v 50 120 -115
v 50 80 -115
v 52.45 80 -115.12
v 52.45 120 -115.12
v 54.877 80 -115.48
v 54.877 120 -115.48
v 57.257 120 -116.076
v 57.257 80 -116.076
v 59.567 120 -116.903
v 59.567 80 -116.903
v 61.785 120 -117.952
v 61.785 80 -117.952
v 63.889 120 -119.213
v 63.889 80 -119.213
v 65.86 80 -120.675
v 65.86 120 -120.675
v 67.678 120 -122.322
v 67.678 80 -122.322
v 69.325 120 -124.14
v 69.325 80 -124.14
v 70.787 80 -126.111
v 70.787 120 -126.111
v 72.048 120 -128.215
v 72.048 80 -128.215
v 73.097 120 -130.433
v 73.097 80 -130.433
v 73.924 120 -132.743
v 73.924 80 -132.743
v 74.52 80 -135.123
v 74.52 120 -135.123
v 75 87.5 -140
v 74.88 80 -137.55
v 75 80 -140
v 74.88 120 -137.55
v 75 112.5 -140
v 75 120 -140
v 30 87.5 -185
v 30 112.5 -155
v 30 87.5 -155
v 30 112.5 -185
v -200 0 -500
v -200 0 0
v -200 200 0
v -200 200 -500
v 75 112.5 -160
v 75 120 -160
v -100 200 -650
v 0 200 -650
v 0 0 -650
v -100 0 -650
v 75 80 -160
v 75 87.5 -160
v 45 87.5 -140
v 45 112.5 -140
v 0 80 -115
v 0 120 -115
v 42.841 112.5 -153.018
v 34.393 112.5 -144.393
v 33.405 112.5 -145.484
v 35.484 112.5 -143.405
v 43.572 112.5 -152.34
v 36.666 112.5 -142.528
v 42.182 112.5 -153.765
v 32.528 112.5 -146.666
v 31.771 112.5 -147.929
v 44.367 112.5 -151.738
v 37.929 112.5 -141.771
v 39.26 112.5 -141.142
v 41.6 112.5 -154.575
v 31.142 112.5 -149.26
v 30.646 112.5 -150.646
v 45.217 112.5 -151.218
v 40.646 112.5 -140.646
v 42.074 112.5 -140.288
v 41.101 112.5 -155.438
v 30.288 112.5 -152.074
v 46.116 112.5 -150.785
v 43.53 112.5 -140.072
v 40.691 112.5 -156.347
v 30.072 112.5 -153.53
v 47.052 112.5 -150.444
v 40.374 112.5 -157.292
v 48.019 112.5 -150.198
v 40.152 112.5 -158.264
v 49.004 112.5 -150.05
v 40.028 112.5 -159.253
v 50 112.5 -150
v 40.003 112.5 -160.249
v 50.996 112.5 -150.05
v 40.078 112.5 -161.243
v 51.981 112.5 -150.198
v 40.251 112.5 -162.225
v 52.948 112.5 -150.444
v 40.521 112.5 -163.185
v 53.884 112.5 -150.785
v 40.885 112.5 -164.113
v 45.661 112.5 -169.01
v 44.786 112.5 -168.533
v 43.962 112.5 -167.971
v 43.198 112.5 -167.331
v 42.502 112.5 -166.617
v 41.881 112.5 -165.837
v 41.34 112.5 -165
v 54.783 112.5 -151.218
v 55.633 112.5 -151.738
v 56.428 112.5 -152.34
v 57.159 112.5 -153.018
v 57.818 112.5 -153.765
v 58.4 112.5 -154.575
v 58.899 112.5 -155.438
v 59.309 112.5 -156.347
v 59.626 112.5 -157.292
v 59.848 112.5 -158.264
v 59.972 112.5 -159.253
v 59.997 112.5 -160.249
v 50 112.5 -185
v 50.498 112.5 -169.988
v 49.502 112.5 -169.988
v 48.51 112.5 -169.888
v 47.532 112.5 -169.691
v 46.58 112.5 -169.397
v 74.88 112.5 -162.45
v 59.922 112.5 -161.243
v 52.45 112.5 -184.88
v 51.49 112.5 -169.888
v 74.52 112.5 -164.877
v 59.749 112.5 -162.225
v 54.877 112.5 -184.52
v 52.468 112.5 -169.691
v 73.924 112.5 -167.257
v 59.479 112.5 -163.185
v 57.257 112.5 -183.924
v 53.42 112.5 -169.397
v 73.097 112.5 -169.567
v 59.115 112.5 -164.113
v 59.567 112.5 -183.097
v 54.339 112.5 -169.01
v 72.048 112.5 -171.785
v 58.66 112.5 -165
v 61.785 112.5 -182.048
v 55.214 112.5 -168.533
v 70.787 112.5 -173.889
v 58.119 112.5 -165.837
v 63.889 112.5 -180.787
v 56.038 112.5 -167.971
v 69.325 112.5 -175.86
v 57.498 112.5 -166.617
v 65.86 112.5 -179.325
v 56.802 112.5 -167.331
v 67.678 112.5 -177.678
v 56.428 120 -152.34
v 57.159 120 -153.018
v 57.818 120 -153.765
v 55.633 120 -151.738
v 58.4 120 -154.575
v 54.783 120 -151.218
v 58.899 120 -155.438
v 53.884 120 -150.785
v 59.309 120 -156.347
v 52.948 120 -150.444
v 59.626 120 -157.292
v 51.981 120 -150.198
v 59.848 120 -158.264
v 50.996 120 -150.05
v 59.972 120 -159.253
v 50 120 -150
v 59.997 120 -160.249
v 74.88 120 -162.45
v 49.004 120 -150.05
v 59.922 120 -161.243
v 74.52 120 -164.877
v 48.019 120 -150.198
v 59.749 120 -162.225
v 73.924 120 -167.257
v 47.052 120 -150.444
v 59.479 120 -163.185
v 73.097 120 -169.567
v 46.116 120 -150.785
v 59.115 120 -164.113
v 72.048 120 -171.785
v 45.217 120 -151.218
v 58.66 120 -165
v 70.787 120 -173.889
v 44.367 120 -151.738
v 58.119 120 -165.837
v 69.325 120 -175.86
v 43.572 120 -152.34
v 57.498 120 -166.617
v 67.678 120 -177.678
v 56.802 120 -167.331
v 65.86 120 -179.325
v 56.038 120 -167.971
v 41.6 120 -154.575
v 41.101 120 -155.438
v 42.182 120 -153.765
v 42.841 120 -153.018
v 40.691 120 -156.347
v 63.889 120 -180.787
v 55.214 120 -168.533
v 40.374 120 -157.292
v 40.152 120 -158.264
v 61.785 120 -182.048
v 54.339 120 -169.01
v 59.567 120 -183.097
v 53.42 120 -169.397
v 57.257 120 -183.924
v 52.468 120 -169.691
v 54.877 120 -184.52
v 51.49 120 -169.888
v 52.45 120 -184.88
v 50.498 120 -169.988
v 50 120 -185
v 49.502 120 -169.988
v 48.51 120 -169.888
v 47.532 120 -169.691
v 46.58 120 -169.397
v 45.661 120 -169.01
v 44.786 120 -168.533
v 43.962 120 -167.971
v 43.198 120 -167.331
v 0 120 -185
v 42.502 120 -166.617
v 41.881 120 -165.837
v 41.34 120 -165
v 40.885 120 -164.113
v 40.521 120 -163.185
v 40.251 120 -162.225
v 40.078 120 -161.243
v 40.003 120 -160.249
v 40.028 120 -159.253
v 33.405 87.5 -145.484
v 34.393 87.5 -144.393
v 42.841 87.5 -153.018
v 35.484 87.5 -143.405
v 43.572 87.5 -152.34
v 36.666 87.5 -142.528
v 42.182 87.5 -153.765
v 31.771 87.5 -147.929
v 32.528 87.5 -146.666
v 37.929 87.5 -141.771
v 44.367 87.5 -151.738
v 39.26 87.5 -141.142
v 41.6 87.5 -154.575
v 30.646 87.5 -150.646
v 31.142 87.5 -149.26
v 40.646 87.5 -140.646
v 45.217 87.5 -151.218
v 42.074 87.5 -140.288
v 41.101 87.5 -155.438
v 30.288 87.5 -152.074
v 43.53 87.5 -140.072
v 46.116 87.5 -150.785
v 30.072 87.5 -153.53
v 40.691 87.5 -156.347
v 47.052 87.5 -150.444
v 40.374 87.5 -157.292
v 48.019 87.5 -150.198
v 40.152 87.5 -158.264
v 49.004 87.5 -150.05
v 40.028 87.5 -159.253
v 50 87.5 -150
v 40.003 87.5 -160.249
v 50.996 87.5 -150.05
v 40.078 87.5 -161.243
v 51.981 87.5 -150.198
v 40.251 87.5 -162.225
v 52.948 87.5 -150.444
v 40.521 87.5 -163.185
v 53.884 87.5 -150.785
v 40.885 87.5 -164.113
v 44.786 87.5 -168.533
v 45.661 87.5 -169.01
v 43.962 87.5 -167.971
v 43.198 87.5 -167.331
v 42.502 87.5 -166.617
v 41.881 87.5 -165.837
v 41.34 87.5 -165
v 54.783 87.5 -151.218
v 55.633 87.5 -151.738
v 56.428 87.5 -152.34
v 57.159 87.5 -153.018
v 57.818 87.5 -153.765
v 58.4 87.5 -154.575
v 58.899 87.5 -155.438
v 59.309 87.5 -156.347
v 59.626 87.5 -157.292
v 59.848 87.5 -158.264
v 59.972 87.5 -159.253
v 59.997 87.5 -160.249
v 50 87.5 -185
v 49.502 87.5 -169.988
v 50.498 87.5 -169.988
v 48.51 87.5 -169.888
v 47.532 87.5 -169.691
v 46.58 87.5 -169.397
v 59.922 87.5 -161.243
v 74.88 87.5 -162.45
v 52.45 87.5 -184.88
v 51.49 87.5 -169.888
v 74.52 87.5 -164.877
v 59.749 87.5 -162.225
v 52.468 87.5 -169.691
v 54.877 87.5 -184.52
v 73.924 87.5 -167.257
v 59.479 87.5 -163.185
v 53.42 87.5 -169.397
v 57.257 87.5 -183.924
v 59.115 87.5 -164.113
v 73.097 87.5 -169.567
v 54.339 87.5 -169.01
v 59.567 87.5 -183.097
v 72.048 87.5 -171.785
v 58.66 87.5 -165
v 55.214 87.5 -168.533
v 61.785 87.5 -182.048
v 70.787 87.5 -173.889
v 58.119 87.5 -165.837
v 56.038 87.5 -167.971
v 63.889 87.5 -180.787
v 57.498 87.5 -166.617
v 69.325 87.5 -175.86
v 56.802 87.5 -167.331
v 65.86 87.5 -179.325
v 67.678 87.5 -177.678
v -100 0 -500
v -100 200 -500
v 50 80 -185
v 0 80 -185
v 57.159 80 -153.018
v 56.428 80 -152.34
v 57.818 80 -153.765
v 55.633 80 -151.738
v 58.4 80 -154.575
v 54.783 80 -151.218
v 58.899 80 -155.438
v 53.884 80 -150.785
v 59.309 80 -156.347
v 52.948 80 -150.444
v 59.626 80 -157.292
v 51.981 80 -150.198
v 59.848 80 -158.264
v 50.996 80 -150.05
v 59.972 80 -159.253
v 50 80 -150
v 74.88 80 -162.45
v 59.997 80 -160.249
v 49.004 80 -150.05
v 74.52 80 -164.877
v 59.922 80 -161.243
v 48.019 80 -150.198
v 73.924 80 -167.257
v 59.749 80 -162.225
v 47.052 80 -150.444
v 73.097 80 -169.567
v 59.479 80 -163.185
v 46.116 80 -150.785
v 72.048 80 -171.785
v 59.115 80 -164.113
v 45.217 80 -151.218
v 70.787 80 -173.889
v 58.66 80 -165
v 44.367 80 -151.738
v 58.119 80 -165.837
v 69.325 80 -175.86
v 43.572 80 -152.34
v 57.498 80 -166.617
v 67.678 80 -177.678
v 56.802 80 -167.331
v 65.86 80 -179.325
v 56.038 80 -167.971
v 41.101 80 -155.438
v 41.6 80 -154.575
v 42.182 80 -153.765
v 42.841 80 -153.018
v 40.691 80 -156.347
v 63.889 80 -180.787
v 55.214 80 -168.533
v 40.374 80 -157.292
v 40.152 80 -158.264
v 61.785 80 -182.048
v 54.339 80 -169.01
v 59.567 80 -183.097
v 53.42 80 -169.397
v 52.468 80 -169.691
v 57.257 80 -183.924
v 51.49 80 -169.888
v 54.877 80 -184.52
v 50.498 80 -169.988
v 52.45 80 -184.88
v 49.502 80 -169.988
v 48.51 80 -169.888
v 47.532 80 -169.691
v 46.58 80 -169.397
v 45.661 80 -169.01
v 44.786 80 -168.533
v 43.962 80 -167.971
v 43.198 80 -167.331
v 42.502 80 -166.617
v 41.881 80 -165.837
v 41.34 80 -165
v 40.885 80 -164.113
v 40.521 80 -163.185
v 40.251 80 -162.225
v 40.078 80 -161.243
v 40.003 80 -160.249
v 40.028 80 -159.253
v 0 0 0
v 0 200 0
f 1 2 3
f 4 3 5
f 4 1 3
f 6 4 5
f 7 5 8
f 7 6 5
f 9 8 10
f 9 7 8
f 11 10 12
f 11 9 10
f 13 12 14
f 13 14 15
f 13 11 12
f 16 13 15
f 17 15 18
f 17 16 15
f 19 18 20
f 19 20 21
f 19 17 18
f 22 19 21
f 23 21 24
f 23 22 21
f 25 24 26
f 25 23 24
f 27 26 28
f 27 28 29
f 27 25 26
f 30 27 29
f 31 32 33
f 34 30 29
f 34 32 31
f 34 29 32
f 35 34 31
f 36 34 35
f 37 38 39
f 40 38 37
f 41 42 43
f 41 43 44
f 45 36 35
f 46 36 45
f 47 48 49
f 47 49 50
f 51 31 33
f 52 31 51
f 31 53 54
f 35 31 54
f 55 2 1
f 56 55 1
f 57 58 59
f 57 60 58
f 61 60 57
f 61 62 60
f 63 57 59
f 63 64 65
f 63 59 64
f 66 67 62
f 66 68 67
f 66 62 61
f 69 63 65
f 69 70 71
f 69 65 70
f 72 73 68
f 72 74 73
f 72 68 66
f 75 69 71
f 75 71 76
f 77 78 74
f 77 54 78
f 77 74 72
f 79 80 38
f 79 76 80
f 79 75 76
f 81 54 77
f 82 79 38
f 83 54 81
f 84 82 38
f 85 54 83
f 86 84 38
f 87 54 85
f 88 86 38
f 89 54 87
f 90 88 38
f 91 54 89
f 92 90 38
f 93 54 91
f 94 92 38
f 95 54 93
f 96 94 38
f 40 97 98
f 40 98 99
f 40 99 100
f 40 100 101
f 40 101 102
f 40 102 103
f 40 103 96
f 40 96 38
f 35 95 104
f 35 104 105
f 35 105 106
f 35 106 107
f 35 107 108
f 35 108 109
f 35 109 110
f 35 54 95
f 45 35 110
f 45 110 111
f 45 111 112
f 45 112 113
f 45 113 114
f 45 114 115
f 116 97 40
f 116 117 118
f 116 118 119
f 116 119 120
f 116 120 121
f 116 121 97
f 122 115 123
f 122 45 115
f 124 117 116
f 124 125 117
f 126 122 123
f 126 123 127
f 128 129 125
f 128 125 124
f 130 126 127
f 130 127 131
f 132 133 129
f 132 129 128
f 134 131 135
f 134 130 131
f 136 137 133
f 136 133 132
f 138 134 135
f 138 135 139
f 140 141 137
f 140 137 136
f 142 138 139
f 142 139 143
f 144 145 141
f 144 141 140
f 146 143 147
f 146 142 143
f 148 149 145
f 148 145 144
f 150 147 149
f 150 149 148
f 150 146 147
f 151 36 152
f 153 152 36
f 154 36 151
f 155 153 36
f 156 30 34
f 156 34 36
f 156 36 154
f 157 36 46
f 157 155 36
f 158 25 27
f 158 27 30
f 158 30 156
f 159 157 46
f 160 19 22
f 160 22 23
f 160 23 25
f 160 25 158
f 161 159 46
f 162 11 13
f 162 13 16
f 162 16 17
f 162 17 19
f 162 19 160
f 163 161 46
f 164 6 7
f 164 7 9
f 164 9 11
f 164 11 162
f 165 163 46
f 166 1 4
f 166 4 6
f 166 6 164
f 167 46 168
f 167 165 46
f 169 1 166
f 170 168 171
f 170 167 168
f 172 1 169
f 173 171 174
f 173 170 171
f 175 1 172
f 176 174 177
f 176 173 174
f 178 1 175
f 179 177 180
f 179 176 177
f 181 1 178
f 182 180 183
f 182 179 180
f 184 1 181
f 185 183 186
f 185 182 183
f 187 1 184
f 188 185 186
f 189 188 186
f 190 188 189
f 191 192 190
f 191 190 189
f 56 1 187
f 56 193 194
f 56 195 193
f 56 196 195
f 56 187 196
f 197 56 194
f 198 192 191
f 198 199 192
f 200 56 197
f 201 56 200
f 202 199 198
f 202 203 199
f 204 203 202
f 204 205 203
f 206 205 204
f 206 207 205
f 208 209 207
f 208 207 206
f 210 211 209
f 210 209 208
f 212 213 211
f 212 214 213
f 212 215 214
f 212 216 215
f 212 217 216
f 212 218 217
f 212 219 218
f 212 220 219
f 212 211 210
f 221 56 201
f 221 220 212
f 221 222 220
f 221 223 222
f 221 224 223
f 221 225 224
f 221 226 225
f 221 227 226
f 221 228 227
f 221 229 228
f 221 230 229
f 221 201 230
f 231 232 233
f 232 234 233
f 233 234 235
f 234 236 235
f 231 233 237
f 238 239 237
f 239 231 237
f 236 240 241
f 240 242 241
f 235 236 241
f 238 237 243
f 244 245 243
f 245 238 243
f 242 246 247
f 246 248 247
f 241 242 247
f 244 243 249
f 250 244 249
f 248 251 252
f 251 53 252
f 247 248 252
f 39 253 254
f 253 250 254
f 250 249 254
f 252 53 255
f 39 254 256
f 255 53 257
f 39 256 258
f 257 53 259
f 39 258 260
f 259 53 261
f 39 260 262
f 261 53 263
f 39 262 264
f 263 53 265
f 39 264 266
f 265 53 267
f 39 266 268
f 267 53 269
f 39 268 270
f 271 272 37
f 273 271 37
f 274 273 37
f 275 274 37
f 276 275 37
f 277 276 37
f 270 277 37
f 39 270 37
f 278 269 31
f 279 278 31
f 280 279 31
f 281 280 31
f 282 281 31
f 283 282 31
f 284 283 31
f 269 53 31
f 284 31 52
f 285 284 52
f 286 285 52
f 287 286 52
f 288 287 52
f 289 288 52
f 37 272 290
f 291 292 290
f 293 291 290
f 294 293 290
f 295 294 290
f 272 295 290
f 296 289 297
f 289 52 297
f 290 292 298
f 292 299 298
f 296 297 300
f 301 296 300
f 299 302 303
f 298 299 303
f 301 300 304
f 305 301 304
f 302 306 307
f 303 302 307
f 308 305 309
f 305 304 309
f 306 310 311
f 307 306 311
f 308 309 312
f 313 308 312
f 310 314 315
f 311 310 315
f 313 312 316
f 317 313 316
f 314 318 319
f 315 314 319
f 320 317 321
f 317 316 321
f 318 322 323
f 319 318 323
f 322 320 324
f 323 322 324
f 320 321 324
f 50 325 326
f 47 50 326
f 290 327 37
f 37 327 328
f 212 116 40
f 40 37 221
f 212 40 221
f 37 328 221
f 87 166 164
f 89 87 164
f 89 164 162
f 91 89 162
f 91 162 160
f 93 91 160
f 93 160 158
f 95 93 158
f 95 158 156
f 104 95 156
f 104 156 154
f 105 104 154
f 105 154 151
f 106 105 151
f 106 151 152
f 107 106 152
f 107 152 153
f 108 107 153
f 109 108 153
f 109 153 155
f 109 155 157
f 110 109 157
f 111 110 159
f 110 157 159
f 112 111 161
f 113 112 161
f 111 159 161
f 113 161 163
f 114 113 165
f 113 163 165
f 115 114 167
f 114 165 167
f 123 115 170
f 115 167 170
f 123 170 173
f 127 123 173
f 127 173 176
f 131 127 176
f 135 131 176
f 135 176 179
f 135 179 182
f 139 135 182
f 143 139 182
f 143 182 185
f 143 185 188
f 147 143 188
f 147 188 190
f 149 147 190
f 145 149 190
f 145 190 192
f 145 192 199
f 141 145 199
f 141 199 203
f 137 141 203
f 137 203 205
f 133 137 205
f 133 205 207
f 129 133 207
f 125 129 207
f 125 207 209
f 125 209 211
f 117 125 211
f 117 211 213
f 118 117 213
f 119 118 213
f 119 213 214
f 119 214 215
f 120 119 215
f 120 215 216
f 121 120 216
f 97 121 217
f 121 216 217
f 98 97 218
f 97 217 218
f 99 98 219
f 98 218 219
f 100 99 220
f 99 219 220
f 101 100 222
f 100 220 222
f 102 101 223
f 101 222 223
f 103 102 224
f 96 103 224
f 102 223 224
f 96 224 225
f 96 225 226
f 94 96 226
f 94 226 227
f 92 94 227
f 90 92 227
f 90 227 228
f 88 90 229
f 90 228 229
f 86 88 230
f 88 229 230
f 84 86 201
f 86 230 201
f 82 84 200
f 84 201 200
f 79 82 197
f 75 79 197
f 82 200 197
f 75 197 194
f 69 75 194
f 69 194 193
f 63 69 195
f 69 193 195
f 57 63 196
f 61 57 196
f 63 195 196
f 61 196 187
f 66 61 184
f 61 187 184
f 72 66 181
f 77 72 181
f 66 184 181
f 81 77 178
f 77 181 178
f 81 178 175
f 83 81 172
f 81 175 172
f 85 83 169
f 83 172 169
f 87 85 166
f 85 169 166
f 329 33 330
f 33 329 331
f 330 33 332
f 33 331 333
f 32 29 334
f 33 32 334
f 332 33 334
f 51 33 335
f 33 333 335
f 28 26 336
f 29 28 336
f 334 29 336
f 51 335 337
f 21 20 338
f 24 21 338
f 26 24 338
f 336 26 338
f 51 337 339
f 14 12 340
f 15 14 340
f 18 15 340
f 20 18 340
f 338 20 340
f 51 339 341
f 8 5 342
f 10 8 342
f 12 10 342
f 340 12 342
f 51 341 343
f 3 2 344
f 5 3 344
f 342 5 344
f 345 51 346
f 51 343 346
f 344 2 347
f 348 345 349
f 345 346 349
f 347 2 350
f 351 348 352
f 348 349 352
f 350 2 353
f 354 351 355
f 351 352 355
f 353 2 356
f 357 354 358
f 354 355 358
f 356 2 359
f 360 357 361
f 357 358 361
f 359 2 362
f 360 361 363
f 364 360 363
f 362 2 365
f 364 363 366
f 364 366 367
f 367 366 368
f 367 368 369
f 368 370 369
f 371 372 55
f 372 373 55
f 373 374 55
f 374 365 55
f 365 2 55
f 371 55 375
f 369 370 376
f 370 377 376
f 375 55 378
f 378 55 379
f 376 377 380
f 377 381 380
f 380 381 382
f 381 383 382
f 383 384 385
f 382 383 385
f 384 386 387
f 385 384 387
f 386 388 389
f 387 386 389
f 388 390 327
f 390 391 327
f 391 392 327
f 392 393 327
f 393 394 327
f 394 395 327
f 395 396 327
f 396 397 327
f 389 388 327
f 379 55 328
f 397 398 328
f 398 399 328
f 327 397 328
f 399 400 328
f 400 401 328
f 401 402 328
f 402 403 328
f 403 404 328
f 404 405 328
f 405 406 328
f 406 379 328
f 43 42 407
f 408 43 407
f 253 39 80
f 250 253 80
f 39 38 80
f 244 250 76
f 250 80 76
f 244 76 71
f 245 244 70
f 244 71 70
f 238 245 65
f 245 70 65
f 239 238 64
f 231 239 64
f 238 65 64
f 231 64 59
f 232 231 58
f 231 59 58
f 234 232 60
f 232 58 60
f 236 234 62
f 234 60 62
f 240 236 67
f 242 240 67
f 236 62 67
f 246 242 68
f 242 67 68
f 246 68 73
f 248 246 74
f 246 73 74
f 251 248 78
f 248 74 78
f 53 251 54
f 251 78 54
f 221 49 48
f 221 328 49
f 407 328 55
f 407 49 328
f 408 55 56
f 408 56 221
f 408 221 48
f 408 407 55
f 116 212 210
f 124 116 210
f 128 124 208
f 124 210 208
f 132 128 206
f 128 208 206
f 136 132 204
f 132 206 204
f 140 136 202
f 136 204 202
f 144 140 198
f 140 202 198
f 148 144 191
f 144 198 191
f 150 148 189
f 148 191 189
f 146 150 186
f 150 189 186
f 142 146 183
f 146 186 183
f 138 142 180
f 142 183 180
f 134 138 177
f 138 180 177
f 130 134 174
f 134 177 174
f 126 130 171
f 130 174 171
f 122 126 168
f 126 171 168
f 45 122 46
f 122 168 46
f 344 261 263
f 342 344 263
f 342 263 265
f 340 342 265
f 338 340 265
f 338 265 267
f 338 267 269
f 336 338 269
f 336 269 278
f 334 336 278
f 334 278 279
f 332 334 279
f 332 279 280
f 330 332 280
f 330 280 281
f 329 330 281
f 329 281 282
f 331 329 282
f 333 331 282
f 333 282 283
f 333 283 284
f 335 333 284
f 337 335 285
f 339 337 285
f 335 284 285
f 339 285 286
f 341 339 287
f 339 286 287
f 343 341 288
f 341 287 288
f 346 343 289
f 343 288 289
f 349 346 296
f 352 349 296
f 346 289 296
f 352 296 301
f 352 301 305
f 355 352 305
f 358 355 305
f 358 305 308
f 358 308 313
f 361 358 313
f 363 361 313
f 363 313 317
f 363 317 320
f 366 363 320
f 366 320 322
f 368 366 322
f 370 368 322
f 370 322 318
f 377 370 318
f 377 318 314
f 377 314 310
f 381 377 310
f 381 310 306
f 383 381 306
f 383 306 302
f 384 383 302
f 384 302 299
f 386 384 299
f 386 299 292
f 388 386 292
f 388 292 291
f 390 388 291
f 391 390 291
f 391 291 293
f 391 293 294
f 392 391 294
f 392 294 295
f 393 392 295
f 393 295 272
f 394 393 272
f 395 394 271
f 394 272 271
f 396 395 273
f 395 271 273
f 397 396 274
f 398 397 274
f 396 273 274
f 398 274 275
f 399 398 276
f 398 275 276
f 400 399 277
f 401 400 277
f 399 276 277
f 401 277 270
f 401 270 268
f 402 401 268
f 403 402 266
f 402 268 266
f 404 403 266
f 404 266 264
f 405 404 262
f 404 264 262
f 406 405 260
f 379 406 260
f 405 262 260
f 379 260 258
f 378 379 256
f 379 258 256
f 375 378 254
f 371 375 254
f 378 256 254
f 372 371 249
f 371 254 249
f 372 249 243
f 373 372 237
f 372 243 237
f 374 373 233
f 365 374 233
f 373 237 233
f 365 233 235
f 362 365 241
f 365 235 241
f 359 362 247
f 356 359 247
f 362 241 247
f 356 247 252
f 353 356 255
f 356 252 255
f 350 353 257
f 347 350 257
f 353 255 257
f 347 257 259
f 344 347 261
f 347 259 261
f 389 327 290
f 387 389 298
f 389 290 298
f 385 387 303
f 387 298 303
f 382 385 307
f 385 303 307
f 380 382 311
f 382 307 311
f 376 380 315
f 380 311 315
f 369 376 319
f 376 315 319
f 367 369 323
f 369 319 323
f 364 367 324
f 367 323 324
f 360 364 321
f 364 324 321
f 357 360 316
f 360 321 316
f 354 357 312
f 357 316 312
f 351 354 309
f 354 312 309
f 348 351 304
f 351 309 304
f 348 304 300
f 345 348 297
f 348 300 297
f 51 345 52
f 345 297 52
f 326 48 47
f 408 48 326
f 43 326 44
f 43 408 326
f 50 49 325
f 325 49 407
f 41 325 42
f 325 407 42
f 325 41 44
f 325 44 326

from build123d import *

# Parameters (mm, degrees)
SKETCH1_W           = 200
SKETCH1_H           = 500
BOSS_EXTRUDE1_DEPTH = 200
SKETCH2_W           = 70
SKETCH2_H           = 40
BOSS_EXTRUDE2_DEPTH = 75
FILLET1_R           = 25
SKETCH3_R           = 10
CUT_EXTRUDE1_DEPTH  = 75
SKETCH4_W           = 100
SKETCH4_H           = 200
BOSS_EXTRUDE3_DEPTH = 150
SKETCH6_W           = 45
SKETCH6_H           = 25
CUT_EXTRUDE2_DEPTH  = 45
FILLET2_R           = 15


with BuildPart() as part:
    # Sketch1 → Boss-Extrude1 (new body)
    with BuildSketch(Plane(origin=(0, 0, 0), x_dir=(1, 0, 0), z_dir=(0, 1, 0))):
        with Locations((-100, 250)):
            Rectangle(SKETCH1_W, SKETCH1_H)
    extrude(amount=BOSS_EXTRUDE1_DEPTH)

    # Sketch2 → Boss-Extrude2 (add)
    with BuildSketch(Plane(origin=(0, 0, 0), x_dir=(0, 0, -1), z_dir=(1, 0, 0))):
        with Locations((150, 100)):
            Rectangle(SKETCH2_W, SKETCH2_H)
    extrude(amount=BOSS_EXTRUDE2_DEPTH)

    # Fillet1
    fillet1_edges = [part.edges().sort_by_distance(p)[0] for p in [
        (75, 100, -185),
        (75, 100, -115),
    ]]
    fillet(fillet1_edges, radius=FILLET1_R)

    # Sketch3 → Cut-Extrude1 (cut)
    with BuildSketch(Plane(origin=(0, 120, 0), x_dir=(1, 0, 0), z_dir=(0, 1, 0))):
        with Locations(Location((50, 160, 0), (0, 0, 270))):
            Circle(SKETCH3_R)
    extrude(amount=-CUT_EXTRUDE1_DEPTH, mode=Mode.SUBTRACT)

    # Sketch4 → Boss-Extrude3 (add)
    with BuildSketch(Plane(origin=(0, 0, -500), x_dir=(-1, 0, 0), z_dir=(0, 0, -1))):
        with Locations((50, 100)):
            Rectangle(SKETCH4_W, SKETCH4_H)
    extrude(amount=BOSS_EXTRUDE3_DEPTH)

    # Sketch6 → Cut-Extrude2 (cut)
    with BuildSketch(Plane(origin=(75, 0, 0), x_dir=(0, 0, -1), z_dir=(1, 0, 0))):
        with Locations((162.5, 100)):
            Rectangle(SKETCH6_W, SKETCH6_H)
    extrude(amount=-CUT_EXTRUDE2_DEPTH, mode=Mode.SUBTRACT)

    # Fillet2
    fillet2_edges = [part.edges().sort_by_distance(p)[0] for p in [
        (30, 100, -140),
    ]]
    fillet(fillet2_edges, radius=FILLET2_R)


solid = part.part
